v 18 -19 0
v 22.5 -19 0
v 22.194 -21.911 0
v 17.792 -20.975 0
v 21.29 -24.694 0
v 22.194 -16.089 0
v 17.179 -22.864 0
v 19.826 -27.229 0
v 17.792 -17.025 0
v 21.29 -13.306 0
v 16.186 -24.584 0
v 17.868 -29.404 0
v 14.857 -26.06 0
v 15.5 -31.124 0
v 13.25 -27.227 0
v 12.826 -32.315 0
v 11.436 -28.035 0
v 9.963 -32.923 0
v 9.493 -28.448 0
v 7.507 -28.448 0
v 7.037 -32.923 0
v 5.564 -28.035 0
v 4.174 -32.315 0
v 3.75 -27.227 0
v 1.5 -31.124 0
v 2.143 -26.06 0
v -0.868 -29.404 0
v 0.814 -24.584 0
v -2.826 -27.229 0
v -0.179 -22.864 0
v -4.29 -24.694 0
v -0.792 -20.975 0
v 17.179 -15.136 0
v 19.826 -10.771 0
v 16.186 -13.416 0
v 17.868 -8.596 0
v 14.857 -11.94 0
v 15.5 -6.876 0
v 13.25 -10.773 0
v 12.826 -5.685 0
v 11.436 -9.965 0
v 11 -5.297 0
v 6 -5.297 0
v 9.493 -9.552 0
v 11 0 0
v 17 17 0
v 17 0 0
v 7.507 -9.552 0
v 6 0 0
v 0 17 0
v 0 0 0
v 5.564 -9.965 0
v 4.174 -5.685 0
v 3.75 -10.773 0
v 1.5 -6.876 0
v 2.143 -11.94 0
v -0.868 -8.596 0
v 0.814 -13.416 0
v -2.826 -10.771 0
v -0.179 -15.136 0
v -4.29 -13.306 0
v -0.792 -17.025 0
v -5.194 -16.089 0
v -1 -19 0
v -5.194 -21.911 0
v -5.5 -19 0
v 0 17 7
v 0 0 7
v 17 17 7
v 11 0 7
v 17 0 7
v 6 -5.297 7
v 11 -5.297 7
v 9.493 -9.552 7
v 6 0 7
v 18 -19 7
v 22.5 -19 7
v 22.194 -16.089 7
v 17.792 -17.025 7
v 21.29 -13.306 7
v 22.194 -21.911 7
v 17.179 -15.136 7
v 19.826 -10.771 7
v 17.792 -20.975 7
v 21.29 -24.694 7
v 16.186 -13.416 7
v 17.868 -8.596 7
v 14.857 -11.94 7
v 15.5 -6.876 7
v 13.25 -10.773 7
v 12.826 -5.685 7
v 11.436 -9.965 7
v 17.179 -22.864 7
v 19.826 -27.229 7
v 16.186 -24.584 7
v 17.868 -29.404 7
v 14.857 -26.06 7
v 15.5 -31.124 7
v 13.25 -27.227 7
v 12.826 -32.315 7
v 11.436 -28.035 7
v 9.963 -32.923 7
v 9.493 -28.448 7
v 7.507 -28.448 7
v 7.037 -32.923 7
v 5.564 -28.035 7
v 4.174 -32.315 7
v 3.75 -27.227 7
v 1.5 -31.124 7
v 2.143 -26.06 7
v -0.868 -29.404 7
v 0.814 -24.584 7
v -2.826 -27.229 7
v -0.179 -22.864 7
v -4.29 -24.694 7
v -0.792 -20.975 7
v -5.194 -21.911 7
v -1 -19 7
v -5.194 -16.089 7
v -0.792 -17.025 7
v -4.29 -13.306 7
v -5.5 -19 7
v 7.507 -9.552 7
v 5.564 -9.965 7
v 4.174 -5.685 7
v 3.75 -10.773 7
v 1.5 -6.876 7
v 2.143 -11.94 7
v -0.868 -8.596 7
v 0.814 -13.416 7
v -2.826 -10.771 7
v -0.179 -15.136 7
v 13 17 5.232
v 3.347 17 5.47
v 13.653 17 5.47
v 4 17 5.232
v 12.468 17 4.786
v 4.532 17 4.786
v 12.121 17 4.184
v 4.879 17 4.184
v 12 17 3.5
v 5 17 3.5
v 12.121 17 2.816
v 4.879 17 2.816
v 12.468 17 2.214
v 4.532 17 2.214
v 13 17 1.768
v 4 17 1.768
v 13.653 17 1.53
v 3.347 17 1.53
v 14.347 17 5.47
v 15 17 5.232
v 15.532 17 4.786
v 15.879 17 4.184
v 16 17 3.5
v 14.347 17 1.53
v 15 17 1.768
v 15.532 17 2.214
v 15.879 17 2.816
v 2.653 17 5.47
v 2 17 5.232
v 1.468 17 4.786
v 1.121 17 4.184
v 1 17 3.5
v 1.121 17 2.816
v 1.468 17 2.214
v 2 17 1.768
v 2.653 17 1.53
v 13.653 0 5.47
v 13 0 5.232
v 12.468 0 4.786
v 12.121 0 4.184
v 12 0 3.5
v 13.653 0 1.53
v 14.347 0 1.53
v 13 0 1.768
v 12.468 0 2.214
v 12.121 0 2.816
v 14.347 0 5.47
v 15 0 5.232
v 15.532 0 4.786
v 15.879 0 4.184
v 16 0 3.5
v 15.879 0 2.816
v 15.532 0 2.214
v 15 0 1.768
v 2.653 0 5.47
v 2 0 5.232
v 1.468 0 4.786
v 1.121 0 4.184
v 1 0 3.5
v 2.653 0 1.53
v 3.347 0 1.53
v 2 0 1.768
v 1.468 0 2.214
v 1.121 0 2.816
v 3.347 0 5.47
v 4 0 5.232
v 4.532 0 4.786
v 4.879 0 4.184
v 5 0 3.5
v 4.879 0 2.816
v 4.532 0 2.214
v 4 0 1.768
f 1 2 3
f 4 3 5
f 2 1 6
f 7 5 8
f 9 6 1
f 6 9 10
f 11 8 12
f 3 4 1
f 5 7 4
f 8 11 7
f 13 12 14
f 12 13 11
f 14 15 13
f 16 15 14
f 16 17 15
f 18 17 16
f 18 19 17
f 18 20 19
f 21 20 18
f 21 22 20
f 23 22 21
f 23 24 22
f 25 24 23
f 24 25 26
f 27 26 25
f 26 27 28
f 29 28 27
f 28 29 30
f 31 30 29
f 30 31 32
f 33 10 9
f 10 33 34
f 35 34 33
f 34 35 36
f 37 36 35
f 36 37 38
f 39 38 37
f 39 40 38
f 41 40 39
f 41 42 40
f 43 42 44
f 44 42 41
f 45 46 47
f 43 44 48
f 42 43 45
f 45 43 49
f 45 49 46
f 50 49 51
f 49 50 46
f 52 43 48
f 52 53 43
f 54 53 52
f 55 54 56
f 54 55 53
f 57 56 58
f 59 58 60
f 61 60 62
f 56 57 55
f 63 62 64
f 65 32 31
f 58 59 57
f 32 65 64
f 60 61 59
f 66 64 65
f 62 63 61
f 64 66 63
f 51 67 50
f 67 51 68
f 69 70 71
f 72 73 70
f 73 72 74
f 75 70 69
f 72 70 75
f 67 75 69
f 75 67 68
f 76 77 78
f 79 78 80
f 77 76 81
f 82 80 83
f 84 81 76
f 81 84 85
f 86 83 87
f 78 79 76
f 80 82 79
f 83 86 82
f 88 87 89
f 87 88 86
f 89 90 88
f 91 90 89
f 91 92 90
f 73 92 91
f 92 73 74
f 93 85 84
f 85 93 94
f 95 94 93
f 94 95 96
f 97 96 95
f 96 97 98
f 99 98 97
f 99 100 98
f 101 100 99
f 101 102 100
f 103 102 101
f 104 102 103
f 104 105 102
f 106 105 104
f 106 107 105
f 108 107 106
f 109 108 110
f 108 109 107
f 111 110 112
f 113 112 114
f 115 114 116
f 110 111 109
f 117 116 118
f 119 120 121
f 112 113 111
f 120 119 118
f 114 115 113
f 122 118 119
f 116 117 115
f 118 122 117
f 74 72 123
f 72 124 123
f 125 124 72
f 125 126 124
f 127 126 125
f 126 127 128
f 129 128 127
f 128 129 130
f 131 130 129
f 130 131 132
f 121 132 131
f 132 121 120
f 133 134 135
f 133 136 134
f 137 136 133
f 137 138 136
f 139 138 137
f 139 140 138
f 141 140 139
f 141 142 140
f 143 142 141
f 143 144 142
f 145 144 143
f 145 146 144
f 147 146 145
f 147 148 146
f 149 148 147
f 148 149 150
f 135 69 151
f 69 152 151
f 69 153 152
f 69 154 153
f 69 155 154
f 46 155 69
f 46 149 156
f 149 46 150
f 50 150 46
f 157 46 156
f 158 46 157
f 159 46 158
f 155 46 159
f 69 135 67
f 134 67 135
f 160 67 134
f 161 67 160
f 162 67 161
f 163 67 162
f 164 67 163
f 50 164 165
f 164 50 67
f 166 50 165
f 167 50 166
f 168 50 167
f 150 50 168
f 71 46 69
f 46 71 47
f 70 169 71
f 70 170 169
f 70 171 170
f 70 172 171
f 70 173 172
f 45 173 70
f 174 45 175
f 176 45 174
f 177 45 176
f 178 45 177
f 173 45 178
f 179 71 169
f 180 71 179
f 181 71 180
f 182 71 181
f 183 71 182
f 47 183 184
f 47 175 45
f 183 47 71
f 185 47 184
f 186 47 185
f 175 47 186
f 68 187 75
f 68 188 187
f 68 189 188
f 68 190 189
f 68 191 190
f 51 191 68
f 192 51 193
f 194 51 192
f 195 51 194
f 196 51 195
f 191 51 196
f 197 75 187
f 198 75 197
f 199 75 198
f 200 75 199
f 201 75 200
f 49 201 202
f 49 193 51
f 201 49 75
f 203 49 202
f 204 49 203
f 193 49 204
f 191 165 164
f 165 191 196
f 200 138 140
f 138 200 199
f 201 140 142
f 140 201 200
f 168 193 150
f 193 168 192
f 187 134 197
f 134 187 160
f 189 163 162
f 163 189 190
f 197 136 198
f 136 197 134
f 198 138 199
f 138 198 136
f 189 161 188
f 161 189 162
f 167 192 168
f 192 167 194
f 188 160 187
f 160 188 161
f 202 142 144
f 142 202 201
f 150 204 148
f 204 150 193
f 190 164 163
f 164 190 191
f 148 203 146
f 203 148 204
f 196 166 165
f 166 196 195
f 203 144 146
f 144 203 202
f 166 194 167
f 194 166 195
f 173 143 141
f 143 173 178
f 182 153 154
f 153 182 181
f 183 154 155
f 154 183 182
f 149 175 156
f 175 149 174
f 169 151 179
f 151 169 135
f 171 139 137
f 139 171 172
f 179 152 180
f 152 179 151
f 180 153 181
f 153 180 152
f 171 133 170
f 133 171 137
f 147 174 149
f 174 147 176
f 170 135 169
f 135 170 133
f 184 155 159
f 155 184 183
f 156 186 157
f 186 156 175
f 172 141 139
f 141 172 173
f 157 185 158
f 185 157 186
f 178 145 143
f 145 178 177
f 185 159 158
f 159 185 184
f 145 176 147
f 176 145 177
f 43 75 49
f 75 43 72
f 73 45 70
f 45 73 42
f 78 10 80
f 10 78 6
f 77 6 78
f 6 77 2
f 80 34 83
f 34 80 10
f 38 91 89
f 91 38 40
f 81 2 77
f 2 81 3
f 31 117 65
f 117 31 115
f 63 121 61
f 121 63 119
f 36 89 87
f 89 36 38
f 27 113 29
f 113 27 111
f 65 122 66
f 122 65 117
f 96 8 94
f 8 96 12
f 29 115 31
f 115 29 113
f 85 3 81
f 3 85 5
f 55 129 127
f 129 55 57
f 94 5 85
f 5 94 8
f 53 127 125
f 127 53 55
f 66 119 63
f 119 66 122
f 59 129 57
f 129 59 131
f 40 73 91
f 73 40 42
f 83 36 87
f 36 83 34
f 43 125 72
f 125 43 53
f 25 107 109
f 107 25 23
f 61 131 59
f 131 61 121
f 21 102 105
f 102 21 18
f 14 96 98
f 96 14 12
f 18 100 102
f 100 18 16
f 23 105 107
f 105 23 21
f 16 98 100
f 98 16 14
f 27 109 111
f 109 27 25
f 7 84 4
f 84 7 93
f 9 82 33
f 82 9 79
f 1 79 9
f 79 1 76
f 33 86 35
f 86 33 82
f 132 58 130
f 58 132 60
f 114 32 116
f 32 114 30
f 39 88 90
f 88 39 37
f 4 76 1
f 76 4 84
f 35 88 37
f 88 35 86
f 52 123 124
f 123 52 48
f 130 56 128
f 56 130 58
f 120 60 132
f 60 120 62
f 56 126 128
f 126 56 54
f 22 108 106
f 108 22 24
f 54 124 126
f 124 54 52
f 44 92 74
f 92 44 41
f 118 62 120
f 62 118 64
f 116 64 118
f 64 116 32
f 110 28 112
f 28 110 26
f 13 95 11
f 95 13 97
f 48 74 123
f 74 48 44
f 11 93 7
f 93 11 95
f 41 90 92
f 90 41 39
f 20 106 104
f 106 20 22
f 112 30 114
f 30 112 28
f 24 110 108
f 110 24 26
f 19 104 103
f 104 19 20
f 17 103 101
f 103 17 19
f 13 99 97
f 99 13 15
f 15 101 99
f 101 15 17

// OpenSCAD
basePlate();
translate([8.5, -19, 0]) sensorMount();

//translate([-8, -19, 0]) rotate ([25, 0, 0])  ledMount();
//translate([25, -19, 0]) rotate ([25, 0, 0]) ledMount();

module basePlate()
{
    bolt_diameter = 4;
    thickness = 4;    
    
    union()
    {
        difference()
        {
            linear_extrude(height=7) square ([17, 17], centre = true);
            
            /* Left hole */
            rotate ([90, 0, 0]) 
            {
                translate([3, 7 / 2, -17])
                cylinder(d = bolt_diameter, h = 17, centre = true, $fn = 18);
            }   
       
            /* Right hole */
            rotate ([90, 0, 0]) 
            {
                translate([17-3, 7 / 2, -17])
                cylinder(d = bolt_diameter, h = 17, centre = true, $fn = 18);
            }          
        }
        
        translate([6, -7, 0])
        linear_extrude(height=7) square ([5, 7], centre = true);
    }
}

module sensorMount()
{
    difference()
    {
        cylinder(d = 28, h = 7, centre = true);
        cylinder(d = 19, h = 7, centre = true);
    }
}

module ledMount()
{
    difference()
    {
        cylinder(d = 8, h = 7, centre = true);
        cylinder(d = 5, h = 7, centre = true);
    }
}
